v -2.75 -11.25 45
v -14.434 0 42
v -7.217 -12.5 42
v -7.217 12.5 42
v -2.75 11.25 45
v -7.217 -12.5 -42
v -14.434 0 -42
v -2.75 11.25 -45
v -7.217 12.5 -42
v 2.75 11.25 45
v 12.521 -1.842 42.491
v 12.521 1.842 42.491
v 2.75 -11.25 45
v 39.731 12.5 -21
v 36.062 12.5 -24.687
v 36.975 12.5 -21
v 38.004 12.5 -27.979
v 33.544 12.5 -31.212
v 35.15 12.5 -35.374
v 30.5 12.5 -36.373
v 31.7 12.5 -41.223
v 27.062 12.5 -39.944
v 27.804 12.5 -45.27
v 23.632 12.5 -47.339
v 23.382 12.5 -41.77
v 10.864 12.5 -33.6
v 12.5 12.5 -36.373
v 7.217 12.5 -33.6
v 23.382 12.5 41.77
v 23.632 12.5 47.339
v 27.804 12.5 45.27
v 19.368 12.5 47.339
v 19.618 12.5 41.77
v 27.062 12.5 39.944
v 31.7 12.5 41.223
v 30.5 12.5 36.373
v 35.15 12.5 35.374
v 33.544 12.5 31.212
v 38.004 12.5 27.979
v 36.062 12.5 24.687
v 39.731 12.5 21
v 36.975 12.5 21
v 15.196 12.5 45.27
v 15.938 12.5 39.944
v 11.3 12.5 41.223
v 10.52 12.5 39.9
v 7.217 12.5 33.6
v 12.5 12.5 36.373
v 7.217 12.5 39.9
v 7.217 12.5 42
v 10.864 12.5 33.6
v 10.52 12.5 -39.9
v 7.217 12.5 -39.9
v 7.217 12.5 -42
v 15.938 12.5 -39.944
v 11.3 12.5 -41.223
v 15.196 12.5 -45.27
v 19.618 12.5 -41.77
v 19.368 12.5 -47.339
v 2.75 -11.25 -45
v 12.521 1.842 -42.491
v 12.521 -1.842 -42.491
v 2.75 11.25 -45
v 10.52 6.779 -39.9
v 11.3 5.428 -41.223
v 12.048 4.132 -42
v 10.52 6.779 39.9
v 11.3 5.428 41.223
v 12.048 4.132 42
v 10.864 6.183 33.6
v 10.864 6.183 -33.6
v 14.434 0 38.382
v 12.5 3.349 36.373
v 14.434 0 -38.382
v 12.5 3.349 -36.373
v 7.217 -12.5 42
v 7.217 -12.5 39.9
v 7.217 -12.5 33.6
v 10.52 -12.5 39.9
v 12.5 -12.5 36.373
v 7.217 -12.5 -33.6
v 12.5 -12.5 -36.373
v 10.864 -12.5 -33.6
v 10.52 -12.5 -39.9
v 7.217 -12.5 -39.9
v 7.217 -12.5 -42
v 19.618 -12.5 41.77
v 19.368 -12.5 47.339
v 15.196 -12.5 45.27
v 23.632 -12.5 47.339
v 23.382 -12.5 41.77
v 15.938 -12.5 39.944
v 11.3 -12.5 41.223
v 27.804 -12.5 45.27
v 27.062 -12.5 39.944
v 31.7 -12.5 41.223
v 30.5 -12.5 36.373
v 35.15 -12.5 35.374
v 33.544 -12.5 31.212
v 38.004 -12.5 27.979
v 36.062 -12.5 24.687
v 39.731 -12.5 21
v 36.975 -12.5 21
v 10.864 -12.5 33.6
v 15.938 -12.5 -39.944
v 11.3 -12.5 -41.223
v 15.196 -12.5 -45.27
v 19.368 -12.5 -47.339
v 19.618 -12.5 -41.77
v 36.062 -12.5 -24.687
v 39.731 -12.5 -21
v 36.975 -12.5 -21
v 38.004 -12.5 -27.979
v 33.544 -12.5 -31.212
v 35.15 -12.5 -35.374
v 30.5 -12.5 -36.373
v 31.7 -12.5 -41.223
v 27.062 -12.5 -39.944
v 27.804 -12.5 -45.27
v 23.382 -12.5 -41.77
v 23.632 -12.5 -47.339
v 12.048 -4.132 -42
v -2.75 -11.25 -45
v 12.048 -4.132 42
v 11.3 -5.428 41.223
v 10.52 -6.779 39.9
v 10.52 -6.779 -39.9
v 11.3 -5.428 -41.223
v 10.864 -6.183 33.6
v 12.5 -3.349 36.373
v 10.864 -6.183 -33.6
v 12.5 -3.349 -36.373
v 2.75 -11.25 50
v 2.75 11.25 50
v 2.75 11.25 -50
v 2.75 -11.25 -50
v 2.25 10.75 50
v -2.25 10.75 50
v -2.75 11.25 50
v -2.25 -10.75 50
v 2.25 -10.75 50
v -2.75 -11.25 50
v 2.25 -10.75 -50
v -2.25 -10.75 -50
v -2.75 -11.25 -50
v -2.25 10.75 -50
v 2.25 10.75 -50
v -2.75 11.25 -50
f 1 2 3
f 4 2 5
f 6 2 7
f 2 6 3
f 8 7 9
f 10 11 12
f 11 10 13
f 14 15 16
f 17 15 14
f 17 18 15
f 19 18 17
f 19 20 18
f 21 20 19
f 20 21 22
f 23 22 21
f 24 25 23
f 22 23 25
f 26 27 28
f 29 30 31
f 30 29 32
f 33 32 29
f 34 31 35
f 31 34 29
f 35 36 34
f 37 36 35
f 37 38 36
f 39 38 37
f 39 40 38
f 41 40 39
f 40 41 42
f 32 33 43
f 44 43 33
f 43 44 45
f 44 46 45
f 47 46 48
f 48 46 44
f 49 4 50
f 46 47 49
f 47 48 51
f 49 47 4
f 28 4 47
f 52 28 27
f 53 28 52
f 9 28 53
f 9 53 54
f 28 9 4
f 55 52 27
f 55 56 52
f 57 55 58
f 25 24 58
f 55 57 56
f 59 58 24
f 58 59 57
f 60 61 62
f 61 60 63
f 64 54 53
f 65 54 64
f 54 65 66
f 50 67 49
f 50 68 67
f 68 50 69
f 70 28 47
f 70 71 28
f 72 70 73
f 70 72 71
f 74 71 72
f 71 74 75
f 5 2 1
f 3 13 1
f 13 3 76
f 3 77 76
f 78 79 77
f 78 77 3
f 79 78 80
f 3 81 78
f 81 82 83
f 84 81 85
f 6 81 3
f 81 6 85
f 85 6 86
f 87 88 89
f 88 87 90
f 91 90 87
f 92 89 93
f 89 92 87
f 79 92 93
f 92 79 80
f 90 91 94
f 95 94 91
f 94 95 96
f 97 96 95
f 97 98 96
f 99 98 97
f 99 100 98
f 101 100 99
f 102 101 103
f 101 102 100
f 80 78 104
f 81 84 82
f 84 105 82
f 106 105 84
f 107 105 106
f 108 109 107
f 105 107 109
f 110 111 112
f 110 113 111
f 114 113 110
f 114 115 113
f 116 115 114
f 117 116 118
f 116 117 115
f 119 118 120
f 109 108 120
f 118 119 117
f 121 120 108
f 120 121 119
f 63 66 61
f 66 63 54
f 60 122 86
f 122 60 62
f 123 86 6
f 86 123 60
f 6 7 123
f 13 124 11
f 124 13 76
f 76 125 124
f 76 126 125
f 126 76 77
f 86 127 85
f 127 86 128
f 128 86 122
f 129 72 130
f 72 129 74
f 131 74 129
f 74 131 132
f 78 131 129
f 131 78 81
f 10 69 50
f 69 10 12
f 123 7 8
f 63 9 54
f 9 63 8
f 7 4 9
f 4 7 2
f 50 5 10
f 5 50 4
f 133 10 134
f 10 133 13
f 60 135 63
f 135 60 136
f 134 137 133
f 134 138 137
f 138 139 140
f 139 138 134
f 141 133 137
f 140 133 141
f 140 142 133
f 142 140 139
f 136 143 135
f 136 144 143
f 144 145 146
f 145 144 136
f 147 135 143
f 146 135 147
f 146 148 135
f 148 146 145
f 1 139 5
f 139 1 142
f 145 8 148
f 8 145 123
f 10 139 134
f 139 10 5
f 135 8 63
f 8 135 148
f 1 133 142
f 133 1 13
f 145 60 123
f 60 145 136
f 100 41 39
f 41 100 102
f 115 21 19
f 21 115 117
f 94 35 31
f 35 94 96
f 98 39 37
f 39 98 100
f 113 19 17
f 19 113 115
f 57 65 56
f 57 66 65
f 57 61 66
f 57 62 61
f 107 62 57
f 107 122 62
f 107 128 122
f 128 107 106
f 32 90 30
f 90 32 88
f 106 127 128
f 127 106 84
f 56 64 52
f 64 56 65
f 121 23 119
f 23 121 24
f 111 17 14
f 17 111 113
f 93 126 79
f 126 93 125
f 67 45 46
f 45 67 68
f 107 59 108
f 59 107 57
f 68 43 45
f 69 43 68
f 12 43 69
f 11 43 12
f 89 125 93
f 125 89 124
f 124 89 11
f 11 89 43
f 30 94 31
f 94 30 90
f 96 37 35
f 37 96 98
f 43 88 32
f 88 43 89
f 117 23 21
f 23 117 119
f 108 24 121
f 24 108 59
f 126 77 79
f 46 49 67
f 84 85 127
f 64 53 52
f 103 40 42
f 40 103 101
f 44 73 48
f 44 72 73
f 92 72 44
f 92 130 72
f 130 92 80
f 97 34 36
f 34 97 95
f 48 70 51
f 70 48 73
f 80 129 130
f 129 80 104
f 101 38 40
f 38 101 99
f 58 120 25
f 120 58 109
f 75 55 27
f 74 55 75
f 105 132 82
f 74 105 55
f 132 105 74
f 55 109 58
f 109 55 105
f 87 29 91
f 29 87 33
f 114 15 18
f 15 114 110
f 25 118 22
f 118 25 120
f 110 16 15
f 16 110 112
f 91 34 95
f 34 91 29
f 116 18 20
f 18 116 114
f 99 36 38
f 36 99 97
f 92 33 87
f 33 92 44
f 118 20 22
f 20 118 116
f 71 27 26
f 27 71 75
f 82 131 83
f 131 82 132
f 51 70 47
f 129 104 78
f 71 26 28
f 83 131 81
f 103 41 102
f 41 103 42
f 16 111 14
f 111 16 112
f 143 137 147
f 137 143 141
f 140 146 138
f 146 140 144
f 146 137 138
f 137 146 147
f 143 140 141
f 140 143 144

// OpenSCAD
/* [Parameters] */
adapter_width=25;
adapter_lenght=84;
hand_width=30;

cutlery_width=20;
cutlery_thickness=3;

/* [Hidden] */

h=adapter_lenght;
w=adapter_width;
cw=cutlery_width+0.5;
ce=cutlery_thickness+0.5;
r=hand_width/2;

//Body
difference() {
union(){
union() {
hull(){
cylinder(h,w/sqrt(3),w/sqrt(3), $fn=6, center=true);
cube(size=[ce+2,cw+2,h+6] , center=true);
}
cube(size=[ce+2,cw+2,h+16] , center=true);
}

//handle
difference() {
    translate([w*0.8+0.1*r,0,0]){
        rotate([90,0,0]){ 
        difference() {
        union(){
            scale([1.2,h/(r*2),1]){
                    cylinder(w,r+2,r+2, center=true);
                    }
            translate([-r/2,0,0]){
            cube(size=[w+0.1*r,0.95*h,w],center=true );
            }
            
        }
        scale([1.2,h/(r*2),1]){
        cylinder(w+10,r,r, center=true);
        }
        }
    }   
    }
    union() {
       cube(size=[w+10,w+10,0.8*h] , center=true);
       cube(size=[10*w,w+40,0.5*h] , center=true);
    }
}
}

//Hole
cube(size=[ce+1,cw+1,h+30] , center=true);
}
